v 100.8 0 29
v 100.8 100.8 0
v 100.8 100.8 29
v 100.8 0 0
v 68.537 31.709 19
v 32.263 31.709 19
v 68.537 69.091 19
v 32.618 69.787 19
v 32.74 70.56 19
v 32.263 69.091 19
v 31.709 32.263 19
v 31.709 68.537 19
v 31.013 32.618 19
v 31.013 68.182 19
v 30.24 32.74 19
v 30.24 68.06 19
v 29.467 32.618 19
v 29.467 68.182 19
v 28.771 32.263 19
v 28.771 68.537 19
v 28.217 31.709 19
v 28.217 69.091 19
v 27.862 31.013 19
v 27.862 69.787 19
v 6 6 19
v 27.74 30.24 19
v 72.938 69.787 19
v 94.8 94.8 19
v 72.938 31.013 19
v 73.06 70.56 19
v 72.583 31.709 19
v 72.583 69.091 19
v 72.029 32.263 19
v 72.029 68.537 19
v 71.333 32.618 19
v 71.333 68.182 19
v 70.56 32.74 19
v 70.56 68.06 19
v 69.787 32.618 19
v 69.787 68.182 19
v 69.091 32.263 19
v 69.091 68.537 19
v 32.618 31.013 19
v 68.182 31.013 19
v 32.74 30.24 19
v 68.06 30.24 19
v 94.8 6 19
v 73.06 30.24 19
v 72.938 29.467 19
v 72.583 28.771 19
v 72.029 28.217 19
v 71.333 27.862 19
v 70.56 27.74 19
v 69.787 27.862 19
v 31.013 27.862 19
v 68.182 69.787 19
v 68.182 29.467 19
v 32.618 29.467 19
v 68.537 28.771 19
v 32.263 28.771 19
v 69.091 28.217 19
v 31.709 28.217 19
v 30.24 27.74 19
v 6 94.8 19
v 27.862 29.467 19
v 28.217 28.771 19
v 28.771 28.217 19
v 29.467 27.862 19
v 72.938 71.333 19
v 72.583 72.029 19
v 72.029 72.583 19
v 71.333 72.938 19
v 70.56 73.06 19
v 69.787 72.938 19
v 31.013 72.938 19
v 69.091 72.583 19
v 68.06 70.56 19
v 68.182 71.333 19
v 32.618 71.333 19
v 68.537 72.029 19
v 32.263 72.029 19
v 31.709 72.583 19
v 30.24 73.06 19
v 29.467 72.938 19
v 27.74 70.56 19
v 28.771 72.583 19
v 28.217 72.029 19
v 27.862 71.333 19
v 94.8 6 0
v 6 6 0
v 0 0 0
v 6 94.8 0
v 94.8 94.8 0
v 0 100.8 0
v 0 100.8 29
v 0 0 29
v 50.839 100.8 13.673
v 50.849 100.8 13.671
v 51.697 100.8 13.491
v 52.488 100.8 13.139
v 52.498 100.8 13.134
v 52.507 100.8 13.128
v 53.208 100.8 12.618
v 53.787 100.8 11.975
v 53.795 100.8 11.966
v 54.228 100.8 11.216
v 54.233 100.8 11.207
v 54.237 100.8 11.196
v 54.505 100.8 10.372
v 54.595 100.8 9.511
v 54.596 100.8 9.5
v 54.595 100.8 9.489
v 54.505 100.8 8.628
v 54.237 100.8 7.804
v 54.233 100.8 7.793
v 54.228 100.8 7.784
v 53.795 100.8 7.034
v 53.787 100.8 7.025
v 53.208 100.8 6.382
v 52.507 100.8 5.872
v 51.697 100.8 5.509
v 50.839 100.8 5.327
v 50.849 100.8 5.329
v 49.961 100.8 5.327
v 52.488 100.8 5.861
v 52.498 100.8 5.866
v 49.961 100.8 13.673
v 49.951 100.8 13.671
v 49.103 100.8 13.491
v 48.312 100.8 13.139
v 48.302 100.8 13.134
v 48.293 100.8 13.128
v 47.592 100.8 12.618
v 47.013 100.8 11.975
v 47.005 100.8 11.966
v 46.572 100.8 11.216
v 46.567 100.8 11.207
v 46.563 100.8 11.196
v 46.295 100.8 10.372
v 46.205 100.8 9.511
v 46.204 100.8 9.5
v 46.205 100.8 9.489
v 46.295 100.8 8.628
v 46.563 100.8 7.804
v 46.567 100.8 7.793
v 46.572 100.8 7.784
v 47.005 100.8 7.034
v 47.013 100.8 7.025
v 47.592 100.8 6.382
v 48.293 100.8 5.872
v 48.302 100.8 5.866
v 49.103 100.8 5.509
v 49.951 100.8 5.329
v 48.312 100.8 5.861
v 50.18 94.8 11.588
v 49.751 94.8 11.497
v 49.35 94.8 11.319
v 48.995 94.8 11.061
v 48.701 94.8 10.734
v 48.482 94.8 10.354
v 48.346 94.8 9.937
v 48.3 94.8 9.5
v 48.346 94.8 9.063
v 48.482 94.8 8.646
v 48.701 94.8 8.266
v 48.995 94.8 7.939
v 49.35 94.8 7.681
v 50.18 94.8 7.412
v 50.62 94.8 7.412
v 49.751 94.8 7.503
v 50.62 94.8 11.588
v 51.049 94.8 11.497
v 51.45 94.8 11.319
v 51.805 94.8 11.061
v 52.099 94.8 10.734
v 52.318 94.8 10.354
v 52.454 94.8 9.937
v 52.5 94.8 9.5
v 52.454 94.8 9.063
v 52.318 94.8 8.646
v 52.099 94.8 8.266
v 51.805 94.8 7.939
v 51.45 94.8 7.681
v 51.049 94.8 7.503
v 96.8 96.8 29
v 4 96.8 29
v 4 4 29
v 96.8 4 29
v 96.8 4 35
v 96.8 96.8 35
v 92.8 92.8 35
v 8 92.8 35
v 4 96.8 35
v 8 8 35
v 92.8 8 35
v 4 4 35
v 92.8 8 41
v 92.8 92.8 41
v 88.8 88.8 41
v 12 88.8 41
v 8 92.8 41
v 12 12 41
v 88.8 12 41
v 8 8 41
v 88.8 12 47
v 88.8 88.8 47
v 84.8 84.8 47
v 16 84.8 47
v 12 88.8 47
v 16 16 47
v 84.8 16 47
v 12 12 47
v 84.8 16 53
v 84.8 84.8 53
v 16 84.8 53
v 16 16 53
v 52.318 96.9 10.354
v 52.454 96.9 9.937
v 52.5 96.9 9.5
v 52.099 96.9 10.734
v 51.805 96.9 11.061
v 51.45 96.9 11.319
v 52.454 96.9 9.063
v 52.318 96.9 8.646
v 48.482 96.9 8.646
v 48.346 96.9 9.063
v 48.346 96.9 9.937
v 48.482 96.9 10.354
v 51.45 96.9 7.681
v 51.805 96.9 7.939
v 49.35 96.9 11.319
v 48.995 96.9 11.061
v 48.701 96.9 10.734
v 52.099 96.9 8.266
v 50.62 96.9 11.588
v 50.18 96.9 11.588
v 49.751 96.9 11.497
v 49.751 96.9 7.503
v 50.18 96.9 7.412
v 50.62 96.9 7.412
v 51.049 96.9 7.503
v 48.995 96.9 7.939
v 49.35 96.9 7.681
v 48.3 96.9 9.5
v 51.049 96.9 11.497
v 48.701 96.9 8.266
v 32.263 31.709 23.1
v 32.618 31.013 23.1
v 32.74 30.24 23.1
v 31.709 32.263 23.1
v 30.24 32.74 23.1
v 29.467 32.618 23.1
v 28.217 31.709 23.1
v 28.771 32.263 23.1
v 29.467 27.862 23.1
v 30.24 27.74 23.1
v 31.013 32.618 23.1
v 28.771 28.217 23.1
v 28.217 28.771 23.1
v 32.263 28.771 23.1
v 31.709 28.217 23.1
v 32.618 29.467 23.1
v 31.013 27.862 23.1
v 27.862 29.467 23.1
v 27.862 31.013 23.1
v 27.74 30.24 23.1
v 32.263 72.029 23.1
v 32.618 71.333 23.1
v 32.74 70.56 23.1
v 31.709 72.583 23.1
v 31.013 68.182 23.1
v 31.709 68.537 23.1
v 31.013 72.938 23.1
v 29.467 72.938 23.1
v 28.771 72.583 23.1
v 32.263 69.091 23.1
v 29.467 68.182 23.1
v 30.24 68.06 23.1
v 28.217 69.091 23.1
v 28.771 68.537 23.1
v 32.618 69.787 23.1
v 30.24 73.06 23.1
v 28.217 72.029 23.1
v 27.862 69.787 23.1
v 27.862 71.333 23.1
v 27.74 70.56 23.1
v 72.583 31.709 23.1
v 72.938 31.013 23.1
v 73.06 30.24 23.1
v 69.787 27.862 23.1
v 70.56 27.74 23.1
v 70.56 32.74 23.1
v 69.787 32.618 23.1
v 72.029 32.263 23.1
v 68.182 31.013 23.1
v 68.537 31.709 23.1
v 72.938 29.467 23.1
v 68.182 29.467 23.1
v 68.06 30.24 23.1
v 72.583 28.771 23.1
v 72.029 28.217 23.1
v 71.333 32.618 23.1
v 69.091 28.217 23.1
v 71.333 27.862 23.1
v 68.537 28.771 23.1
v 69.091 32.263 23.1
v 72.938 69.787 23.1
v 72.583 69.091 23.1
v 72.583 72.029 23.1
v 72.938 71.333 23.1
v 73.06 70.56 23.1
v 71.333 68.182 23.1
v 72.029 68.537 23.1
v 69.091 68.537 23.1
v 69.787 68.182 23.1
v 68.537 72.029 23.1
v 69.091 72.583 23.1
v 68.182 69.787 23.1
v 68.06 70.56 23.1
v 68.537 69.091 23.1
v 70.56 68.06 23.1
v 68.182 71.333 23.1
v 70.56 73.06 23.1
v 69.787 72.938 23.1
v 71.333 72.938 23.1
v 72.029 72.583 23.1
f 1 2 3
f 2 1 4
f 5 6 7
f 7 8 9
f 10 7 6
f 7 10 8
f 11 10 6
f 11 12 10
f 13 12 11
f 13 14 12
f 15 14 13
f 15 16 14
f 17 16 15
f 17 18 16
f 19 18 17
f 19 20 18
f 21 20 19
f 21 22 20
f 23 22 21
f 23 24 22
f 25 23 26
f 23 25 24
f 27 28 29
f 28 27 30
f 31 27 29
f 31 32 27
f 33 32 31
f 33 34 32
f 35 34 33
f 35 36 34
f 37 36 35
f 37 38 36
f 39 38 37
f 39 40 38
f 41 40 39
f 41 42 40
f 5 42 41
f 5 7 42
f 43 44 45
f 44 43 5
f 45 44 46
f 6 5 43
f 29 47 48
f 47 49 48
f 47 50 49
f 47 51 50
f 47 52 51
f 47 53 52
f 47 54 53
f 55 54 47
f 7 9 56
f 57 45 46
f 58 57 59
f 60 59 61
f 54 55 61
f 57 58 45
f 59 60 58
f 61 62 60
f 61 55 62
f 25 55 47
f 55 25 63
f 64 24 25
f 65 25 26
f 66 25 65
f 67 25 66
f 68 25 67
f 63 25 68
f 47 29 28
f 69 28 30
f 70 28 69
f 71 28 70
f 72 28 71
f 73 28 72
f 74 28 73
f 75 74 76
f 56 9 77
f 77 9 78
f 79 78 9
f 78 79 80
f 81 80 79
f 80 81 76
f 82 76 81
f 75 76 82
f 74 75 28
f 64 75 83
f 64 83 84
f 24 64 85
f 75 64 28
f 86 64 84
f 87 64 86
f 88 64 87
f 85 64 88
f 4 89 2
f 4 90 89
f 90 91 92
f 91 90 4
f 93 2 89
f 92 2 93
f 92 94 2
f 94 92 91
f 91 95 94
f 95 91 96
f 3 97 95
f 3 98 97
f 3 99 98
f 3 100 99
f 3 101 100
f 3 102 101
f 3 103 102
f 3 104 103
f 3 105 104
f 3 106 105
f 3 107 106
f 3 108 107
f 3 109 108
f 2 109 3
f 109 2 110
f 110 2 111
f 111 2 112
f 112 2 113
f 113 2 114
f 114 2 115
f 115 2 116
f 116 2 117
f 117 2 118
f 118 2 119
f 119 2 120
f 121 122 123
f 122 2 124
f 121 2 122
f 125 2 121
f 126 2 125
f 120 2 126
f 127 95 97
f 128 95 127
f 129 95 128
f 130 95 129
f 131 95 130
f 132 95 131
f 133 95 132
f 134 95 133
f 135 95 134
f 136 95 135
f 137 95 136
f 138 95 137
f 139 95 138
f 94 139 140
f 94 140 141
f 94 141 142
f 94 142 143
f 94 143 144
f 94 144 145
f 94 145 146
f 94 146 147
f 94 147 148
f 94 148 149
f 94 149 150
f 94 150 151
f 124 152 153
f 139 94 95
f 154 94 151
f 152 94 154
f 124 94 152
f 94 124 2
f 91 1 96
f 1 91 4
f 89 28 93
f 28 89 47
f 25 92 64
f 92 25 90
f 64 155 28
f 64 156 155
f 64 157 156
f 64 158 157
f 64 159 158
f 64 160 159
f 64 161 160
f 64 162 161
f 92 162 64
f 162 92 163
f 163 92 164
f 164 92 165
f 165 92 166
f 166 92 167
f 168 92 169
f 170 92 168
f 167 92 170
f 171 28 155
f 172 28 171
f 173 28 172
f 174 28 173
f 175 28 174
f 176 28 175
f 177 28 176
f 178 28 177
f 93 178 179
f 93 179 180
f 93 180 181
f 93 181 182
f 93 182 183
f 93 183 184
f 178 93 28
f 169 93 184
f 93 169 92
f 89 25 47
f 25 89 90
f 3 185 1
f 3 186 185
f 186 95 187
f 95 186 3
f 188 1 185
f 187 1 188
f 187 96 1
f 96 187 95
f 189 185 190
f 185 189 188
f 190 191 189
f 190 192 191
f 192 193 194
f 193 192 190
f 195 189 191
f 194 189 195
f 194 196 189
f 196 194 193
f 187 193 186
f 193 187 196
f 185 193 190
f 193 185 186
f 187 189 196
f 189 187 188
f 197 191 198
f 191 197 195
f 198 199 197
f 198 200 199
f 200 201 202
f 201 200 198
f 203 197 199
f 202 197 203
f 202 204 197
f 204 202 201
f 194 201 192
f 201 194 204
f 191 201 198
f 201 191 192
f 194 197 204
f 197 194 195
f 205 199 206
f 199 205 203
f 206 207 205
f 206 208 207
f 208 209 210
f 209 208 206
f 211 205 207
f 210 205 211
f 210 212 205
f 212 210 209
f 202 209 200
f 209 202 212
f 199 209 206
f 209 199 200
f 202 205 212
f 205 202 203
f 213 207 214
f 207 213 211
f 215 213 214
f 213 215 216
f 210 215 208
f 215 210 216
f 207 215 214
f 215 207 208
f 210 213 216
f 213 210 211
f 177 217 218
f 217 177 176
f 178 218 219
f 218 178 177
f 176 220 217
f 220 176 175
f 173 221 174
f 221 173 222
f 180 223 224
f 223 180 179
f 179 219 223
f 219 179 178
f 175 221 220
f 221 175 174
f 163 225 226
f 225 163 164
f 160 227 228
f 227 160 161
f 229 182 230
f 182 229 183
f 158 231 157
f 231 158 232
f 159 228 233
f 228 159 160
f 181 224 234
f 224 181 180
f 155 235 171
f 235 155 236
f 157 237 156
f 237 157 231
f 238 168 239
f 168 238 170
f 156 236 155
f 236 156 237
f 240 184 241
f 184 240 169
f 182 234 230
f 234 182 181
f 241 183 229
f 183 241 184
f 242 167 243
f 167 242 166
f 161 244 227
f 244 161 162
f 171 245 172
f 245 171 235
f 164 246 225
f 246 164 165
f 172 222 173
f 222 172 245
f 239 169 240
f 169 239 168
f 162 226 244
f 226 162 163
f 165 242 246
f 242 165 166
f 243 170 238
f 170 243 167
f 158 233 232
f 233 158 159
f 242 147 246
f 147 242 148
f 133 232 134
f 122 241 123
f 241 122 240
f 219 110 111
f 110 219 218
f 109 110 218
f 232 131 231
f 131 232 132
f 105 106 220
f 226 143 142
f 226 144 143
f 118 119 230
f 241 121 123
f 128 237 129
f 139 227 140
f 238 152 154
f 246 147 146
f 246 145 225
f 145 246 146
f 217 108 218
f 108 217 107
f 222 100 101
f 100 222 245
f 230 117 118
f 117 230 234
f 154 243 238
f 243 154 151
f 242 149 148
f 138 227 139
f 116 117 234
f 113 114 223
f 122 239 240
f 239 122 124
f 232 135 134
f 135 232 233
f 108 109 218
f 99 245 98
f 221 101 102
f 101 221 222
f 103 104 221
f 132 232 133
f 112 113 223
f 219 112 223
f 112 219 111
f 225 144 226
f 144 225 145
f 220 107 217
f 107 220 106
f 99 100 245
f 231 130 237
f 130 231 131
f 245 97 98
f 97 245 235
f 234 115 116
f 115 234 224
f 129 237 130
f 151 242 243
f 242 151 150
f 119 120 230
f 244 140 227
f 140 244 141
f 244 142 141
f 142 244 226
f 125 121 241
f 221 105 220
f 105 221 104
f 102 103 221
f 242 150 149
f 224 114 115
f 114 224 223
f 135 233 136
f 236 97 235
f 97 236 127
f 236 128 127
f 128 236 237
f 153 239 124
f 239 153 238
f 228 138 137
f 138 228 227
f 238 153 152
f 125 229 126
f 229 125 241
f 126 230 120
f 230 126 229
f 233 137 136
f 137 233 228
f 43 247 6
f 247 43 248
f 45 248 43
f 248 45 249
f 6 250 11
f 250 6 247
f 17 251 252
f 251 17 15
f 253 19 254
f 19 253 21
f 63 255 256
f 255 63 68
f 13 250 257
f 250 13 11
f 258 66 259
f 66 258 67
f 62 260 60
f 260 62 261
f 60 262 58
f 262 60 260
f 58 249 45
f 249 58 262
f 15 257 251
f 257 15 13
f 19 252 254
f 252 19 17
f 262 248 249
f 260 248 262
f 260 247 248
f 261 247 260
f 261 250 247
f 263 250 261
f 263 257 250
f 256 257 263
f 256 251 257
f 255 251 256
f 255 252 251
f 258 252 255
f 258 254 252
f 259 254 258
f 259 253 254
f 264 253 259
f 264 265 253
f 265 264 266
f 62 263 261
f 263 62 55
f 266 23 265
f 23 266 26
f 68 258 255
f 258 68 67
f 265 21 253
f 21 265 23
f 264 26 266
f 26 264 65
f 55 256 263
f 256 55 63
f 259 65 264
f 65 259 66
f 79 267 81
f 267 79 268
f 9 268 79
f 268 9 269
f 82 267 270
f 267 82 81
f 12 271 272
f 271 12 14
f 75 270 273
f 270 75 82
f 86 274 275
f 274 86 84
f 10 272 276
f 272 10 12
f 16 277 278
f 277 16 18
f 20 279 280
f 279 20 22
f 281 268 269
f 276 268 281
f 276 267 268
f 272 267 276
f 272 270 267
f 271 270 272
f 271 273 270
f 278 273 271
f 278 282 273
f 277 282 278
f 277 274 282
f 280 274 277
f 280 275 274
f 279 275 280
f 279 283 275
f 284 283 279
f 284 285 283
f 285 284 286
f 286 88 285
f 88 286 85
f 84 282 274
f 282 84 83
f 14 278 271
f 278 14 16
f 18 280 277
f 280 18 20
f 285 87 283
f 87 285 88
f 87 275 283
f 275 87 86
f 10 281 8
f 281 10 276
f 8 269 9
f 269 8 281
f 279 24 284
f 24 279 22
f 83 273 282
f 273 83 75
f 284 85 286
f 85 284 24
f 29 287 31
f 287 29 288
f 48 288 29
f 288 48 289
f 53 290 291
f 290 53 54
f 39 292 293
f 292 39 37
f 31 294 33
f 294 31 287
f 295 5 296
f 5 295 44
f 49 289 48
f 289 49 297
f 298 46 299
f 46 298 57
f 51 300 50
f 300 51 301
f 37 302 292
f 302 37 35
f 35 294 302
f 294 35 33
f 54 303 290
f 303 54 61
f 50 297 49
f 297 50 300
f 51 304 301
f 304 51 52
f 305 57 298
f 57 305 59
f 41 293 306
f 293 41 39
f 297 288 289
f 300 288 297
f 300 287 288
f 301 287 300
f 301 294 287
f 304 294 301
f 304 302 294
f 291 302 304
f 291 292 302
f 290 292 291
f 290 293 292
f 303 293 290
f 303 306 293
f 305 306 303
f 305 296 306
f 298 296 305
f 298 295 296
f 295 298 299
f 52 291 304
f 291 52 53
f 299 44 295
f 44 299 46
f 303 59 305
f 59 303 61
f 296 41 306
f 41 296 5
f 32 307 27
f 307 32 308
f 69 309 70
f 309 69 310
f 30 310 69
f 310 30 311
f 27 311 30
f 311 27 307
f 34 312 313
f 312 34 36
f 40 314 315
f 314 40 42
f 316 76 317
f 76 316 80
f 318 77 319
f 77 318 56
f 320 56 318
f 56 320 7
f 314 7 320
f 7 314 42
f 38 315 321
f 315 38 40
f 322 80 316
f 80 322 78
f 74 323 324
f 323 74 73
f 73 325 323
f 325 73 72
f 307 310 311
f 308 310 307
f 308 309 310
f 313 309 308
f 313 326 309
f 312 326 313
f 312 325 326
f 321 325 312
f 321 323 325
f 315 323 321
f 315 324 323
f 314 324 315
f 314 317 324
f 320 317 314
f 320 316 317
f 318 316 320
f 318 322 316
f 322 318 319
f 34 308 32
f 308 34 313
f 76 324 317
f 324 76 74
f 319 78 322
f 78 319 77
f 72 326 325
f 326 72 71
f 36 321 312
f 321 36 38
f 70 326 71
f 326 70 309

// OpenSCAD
// ============================================
// 4x4 Post Cap — Stepped Pyramid, No Flange
// v4 — Side screw, 5 steps
// Material: PLA (test fit) → PETG (final)
// ============================================

// ===== CRITICAL FIT DIMENSIONS =====

post_width = 87.3;      // MEASURED: 3-7/16" = 87.3mm
post_depth = 87.3;      // MEASURED: 3-7/16" = 87.3mm
tolerance = 1.5;        // Gap — ADJUST AFTER TEST PRINT
socket_depth = 19;      // 3/4" = 19mm internal depth
wall_thickness = 6;     // Socket wall thickness

// ===== STEPPED PYRAMID PARAMETERS =====

num_steps = 5;          // 5 steps
step_height = 6;        // Height per step (mm)
step_inset = 4;         // Inward step per side (mm)
top_flat_size = 10;     // Flat area at the very top (mm)

// ===== SIDE SCREW HOLE =====
// Screw goes through ONE socket wall into the post
// Position this wall facing away from view

screw_enabled = true;
screw_shaft_dia = 4.2;  // #8 screw shaft
screw_head_dia = 8.5;   // #8 countersink head
screw_countersink = 4;  // Countersink depth into outer wall

// Screw vertical position (center of screw in socket)
screw_z = socket_depth / 2;  // Halfway up the socket

// Which wall gets the screw: "front", "back", "left", "right"
// Orient the cap so this wall faces away from view
screw_wall = "back";

// ===== DRAIN HOLES =====

drain_holes = true;
drain_hole_dia = 5;

// ===== COMPUTED VALUES =====

socket_inner_w = post_width + tolerance;
socket_inner_d = post_depth + tolerance;
socket_outer_w = socket_inner_w + (wall_thickness * 2);
socket_outer_d = socket_inner_d + (wall_thickness * 2);

// NO FLANGE
cap_outer_w = socket_outer_w;
cap_outer_d = socket_outer_d;

base_thickness = 4;

pyramid_height = num_steps * step_height;
total_height = socket_depth + base_thickness + pyramid_height;

echo(str("=== Post Cap v4 — Stepped, Side Screw ==="));
echo(str("Socket inner: ", socket_inner_w, " x ", socket_inner_d, " mm"));
echo(str("Cap outer: ", cap_outer_w, " x ", cap_outer_d, " mm (", cap_outer_w/25.4, " in)"));
echo(str("Socket depth: ", socket_depth, " mm"));
echo(str("Steps: ", num_steps, " x ", step_height, "mm"));
echo(str("Total height: ", total_height, " mm (", total_height/25.4, " in)"));
echo(str("Screw wall: ", screw_wall));

// ===== MODULES =====

module stepped_pyramid(base_w, base_d, steps, s_height, inset) {
    for (i = [0 : steps - 1]) {
        current_inset = inset * i;
        current_w = base_w - (current_inset * 2);
        current_d = base_d - (current_inset * 2);
        
        if (current_w > top_flat_size && current_d > top_flat_size) {
            translate([current_inset, current_inset, i * s_height])
                cube([current_w, current_d, s_height]);
        } else {
            final_inset = (base_w - top_flat_size) / 2;
            translate([final_inset, final_inset, i * s_height])
                cube([top_flat_size, top_flat_size, s_height]);
        }
    }
}

module side_screw_hole() {
    if (screw_enabled) {
        // Position based on chosen wall
        if (screw_wall == "back") {
            // Screw enters from back wall (Y = max)
            translate([cap_outer_w / 2, cap_outer_d + 0.1, screw_z])
                rotate([90, 0, 0]) {
                    // Through-hole (shaft)
                    cylinder(h = wall_thickness + tolerance/2 + 0.2, 
                             d = screw_shaft_dia, $fn = 30);
                    // Countersink on outer face
                    cylinder(h = screw_countersink, 
                             d1 = screw_head_dia, 
                             d2 = screw_shaft_dia, $fn = 30);
                }
        } else if (screw_wall == "front") {
            translate([cap_outer_w / 2, -0.1, screw_z])
                rotate([-90, 0, 0]) {
                    cylinder(h = wall_thickness + tolerance/2 + 0.2, 
                             d = screw_shaft_dia, $fn = 30);
                    cylinder(h = screw_countersink, 
                             d1 = screw_head_dia, 
                             d2 = screw_shaft_dia, $fn = 30);
                }
        } else if (screw_wall == "left") {
            translate([-0.1, cap_outer_d / 2, screw_z])
                rotate([0, 90, 0]) {
                    cylinder(h = wall_thickness + tolerance/2 + 0.2, 
                             d = screw_shaft_dia, $fn = 30);
                    cylinder(h = screw_countersink, 
                             d1 = screw_head_dia, 
                             d2 = screw_shaft_dia, $fn = 30);
                }
        } else if (screw_wall == "right") {
            translate([cap_outer_w + 0.1, cap_outer_d / 2, screw_z])
                rotate([0, -90, 0]) {
                    cylinder(h = wall_thickness + tolerance/2 + 0.2, 
                             d = screw_shaft_dia, $fn = 30);
                    cylinder(h = screw_countersink, 
                             d1 = screw_head_dia, 
                             d2 = screw_shaft_dia, $fn = 30);
                }
        }
    }
}

module post_cap() {
    difference() {
        union() {
            // --- Socket walls ---
            difference() {
                cube([socket_outer_w, socket_outer_d, socket_depth]);
                translate([wall_thickness, wall_thickness, -0.1])
                    cube([socket_inner_w, socket_inner_d, socket_depth + 0.2]);
            }

            // --- Base plate ---
            translate([0, 0, socket_depth])
                cube([cap_outer_w, cap_outer_d, base_thickness]);

            // --- Stepped pyramid ---
            translate([0, 0, socket_depth + base_thickness])
                stepped_pyramid(cap_outer_w, cap_outer_d, 
                               num_steps, step_height, step_inset);
        }

        // --- Side screw hole ---
        side_screw_hole();

        // --- Drain holes through base plate ---
        if (drain_holes) {
            for (x = [cap_outer_w * 0.3, cap_outer_w * 0.7])
                for (y = [cap_outer_d * 0.3, cap_outer_d * 0.7])
                    translate([x, y, socket_depth - 0.1])
                        cylinder(h = base_thickness + 0.2, d = drain_hole_dia, $fn = 20);
        }
    }
}

// ===== RENDER =====
// Print: socket down, pyramid up
// No supports needed
// Screw wall faces AWAY from view when installed
//
// To change which wall: set screw_wall to
// "front", "back", "left", or "right"
//
// PLA test: 0.2mm layers, 3 walls, 20% infill
// PETG final: 0.2mm layers, 4 walls, 30% gyroid

post_cap();
